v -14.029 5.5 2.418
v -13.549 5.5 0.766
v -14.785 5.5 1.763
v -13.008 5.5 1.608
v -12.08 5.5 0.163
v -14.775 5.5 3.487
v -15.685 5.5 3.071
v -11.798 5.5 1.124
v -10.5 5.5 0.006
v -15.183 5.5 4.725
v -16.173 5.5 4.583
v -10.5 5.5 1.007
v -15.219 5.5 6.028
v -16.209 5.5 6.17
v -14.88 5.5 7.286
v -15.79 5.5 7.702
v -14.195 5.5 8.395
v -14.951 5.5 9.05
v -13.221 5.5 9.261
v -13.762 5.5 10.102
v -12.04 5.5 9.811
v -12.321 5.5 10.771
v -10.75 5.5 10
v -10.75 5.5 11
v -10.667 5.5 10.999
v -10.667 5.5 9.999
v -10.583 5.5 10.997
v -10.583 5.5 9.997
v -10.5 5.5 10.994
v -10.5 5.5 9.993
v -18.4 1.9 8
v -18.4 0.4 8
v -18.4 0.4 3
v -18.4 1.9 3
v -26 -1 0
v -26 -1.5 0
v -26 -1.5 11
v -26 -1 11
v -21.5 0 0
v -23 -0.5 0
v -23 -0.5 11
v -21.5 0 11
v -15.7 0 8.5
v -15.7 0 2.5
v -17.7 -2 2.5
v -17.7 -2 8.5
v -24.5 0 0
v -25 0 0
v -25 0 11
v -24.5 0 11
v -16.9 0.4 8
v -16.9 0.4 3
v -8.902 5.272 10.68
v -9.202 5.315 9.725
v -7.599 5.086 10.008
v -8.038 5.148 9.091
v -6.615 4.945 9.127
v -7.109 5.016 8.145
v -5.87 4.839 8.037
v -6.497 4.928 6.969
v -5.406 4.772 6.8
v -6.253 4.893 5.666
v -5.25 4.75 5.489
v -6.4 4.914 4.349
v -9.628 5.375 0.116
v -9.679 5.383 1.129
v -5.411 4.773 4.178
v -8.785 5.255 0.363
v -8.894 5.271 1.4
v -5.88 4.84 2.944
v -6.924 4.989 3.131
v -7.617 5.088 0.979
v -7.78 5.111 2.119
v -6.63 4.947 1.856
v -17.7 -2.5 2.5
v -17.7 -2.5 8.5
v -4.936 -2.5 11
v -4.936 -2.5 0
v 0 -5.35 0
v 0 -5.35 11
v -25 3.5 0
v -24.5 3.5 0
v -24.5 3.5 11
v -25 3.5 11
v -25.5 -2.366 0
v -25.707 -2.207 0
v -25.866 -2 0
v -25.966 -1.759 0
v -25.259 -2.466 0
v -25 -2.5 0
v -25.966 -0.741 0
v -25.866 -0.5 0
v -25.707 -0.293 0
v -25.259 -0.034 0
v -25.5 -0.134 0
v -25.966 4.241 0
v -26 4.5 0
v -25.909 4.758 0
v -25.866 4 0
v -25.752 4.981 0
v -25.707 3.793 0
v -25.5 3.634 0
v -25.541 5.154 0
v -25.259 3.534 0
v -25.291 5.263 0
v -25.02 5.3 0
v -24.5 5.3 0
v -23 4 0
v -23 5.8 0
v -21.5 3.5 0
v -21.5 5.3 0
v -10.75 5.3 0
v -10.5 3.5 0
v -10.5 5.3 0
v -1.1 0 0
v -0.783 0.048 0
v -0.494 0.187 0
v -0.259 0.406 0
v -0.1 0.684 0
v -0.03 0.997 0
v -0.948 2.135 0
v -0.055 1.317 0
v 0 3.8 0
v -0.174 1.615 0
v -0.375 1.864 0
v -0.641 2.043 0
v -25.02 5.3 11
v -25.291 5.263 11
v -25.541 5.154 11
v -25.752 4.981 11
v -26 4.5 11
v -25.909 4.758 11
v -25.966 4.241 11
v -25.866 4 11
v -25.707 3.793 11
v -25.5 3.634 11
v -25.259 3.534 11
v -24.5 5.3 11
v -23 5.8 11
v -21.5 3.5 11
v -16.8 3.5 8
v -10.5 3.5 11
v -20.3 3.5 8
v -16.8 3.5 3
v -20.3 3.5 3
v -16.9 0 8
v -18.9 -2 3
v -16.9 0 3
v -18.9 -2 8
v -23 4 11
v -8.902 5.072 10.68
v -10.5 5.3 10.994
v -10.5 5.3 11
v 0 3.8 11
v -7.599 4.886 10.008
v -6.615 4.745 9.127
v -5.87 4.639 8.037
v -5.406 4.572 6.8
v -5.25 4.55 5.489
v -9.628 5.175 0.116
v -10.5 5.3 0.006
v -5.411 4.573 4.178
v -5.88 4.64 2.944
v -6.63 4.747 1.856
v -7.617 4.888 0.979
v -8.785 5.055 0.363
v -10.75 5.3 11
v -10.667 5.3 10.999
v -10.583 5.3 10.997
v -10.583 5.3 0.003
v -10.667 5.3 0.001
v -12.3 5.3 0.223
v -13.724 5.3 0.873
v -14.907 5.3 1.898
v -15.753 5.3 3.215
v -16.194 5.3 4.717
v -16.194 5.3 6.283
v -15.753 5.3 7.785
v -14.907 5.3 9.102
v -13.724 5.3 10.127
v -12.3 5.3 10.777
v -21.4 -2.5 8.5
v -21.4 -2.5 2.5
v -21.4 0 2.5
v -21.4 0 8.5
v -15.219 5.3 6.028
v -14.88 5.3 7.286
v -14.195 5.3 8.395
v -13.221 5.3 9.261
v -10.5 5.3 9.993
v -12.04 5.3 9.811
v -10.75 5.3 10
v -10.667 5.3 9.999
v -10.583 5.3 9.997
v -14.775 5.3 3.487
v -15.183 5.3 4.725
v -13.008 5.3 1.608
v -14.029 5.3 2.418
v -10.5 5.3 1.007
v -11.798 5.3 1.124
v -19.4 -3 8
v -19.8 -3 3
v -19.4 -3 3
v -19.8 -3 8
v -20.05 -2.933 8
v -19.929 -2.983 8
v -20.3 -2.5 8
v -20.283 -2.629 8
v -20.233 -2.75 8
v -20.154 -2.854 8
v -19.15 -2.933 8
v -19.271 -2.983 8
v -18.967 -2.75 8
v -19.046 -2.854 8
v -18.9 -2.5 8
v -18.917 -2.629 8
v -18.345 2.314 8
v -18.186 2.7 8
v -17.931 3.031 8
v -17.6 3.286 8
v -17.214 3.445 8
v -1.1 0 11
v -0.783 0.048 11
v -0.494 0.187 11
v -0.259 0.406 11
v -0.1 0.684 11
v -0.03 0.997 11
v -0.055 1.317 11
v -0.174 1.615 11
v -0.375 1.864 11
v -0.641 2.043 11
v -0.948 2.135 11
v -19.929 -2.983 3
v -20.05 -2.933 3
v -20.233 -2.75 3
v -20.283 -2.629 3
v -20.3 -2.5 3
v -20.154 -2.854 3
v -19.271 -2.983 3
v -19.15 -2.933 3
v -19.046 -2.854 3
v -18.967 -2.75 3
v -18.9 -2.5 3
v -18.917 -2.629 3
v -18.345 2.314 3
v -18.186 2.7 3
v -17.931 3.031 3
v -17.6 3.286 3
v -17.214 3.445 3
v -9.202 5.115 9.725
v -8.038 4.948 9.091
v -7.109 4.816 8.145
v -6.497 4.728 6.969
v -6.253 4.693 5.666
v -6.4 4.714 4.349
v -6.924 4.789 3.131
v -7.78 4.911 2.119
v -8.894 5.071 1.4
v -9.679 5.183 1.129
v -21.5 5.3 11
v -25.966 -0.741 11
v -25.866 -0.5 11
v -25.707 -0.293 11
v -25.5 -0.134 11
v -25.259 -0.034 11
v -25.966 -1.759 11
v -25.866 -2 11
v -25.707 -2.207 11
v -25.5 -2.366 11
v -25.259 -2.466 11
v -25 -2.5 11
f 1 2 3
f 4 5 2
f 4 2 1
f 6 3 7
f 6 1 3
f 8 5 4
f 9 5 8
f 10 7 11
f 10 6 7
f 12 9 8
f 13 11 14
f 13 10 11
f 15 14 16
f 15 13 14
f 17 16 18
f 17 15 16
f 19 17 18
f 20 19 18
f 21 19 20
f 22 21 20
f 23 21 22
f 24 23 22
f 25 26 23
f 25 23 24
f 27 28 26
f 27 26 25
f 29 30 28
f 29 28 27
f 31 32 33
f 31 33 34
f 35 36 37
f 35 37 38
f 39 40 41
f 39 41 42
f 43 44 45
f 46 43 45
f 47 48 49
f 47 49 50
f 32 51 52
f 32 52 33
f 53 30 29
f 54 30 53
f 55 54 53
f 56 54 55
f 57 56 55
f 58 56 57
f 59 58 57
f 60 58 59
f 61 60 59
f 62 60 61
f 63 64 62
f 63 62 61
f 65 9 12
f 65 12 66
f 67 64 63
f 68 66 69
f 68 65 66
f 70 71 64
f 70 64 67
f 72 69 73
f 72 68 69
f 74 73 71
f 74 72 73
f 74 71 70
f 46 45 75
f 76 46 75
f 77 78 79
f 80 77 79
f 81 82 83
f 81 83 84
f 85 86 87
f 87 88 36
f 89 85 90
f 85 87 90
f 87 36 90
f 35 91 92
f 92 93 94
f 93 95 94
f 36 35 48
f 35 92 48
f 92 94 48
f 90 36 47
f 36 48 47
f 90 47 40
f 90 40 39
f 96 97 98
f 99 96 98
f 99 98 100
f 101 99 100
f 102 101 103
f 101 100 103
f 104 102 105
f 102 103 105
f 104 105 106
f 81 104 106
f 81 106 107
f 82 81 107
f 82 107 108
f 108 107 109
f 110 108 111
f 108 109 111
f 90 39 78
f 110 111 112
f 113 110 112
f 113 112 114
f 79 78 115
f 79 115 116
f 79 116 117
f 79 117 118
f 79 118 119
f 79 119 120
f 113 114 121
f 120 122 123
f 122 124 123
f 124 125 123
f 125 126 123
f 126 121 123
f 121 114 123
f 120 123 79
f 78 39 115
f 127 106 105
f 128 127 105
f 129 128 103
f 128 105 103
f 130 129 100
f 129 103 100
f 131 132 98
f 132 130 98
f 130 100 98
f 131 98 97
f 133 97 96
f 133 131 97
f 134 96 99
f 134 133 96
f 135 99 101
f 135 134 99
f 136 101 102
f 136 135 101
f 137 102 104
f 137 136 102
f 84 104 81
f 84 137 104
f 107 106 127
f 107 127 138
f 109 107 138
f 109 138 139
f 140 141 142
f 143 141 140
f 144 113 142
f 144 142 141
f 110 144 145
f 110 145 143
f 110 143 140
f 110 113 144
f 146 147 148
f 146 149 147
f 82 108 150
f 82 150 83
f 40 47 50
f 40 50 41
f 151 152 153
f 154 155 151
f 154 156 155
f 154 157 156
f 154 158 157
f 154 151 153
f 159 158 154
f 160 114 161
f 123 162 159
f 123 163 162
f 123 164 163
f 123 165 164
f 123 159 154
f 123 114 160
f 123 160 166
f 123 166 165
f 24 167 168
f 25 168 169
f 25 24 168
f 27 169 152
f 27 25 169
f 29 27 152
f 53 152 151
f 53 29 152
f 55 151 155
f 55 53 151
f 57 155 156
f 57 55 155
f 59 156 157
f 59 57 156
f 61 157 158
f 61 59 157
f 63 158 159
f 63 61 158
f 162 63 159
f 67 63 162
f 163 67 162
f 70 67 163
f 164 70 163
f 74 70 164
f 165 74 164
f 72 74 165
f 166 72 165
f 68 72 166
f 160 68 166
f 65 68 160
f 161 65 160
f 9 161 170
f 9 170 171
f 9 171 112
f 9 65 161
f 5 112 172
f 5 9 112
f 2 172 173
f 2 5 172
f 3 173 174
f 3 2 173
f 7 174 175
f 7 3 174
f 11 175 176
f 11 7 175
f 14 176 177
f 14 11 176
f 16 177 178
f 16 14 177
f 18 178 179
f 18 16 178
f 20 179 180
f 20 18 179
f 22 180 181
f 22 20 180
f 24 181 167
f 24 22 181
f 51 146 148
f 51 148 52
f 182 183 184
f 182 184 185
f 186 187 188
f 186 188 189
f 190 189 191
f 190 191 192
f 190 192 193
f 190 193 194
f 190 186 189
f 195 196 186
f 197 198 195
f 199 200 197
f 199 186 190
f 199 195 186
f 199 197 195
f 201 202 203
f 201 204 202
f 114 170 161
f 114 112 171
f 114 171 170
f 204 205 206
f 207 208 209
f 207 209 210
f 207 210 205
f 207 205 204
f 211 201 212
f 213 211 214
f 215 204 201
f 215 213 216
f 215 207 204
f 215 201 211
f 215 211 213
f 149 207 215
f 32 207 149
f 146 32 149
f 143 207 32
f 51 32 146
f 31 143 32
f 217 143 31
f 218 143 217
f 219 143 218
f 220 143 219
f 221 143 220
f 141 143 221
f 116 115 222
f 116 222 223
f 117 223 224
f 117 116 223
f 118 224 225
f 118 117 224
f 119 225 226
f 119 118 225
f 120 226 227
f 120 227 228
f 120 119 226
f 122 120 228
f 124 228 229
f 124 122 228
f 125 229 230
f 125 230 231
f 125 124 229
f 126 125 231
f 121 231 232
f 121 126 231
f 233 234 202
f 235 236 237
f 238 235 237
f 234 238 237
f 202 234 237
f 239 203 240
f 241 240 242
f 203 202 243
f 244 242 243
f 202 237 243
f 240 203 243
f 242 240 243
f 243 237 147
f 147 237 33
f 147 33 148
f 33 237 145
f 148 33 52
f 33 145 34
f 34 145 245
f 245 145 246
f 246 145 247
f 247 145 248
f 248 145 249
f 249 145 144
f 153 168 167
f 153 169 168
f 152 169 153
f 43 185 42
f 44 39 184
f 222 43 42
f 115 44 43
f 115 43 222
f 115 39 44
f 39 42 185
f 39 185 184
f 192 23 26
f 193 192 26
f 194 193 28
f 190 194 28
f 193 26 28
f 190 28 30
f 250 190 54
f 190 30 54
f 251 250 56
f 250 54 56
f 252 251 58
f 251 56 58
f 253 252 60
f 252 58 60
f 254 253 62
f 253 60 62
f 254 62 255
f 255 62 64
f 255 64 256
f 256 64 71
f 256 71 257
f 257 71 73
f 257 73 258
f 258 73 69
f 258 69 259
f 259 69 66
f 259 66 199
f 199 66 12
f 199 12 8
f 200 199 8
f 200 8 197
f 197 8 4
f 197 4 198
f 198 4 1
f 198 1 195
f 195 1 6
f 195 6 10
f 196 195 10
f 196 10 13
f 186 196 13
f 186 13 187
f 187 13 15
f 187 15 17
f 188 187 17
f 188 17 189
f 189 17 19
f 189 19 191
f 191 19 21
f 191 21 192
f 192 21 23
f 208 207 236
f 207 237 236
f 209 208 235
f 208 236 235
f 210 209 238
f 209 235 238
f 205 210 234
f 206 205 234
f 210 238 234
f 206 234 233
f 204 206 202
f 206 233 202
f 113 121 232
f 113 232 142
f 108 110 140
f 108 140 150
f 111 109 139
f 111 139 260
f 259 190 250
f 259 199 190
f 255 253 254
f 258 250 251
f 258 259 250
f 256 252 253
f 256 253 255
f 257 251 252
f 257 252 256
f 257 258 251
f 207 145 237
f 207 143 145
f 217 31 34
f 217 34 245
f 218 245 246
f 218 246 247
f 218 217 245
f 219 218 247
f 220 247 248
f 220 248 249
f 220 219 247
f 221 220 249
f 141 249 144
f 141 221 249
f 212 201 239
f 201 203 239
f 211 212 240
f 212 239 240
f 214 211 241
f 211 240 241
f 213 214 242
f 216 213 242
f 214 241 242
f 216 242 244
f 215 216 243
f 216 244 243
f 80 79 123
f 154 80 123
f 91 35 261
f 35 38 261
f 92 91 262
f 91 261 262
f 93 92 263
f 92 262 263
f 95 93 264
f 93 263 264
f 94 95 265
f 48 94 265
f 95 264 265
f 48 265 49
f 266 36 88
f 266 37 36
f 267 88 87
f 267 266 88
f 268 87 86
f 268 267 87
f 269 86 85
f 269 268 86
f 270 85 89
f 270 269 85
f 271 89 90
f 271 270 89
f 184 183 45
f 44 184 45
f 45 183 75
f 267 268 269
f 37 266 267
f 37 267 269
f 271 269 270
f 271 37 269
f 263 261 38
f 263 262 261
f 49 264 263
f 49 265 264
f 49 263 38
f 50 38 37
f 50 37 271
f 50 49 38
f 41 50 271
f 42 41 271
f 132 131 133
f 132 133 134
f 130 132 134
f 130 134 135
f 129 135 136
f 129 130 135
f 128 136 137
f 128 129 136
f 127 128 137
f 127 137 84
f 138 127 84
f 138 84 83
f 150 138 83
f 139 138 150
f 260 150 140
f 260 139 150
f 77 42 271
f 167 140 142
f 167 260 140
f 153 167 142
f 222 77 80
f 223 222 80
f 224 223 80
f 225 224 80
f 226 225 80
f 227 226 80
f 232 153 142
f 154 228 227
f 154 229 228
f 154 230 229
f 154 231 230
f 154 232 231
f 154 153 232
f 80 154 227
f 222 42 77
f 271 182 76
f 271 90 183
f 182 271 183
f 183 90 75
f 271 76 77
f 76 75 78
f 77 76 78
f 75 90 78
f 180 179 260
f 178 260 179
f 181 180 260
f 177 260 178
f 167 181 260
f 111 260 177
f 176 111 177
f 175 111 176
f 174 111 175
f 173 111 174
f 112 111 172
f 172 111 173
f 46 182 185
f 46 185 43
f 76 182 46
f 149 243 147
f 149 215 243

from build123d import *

# Parameters (mm, degrees)
BOSS_EXTRUDE1_DEPTH   = 11
BOSS_EXTRUDE1_2_DEPTH = 11
SKETCH2_W             = 5.7
SKETCH2_H             = 6
CUT_EXTRUDE1_DEPTH    = 3
BOSS_EXTRUDE8_DEPTH   = 11
BOSS_EXTRUDE2_DEPTH   = 6
BOSS_EXTRUDE3_START   = -5.5
BOSS_EXTRUDE3_DEPTH   = 2.5
FILLET7_R             = 1
FILLET8_R             = 1
FILLET10_R            = 1
FILLET11_R            = 1
FILLET12_R            = 0.5
BOSS_EXTRUDE7_REACH   = 36.321
BOSS_EXTRUDE7_START   = 5.5
SKETCH6_R             = 5.5
SKETCH6_R_2           = 4.5
CUT_EXTRUDE3_DEPTH    = 29.820825804
BOSS_EXTRUDE9_DEPTH   = 11


with BuildPart() as part:
    # Sketch1 → Boss-Extrude1 (new body)
    with BuildSketch(Plane.XY):
        Polygon((0, 3.8), (0, 2), (-10.5, 3.5), (-21.5, 3.5), (-23, 4), (-24.5, 3.5), (-26, 3.5), (-26, 5.3), (-24.5, 5.3), (-23, 5.8), (-21.5, 5.3), (-10.5, 5.3), align=None)
    extrude(amount=BOSS_EXTRUDE1_DEPTH)



with BuildPart() as body_2:
    # Sketch1 → Boss-Extrude1 2 (new body)
    with BuildSketch(Plane.XY):
        Polygon((0, 0), (0, -2.5), (-26, -2.5), (-26, 0), (-24.5, 0), (-23, -0.5), (-21.5, 0), align=None)
    extrude(amount=BOSS_EXTRUDE1_2_DEPTH)

    # Sketch2 → Cut-Extrude1 (cut)
    with BuildSketch(Plane.XZ.offset(2.5)):
        with Locations((-18.55, 5.5)):
            Rectangle(SKETCH2_W, SKETCH2_H)
    extrude(amount=-CUT_EXTRUDE1_DEPTH, mode=Mode.SUBTRACT)


with BuildPart() as part_1:
    add(part.part)

    add(body_2.part)  # Boss-Extrude8 merges body 2
    # Sketch8 → Boss-Extrude8 (add)
    with BuildSketch(Plane(origin=(0, 0, 0), x_dir=(-1, 0, 0), z_dir=(0, 0, -1))):
        with BuildLine():
            Line((0.948237354, 2.135462479), (0, 2))
            Line((0, 2), (0, 0))
            Line((0, 0), (1.1, 0))
            ThreePointArc((1.1, 0), (0.029575797, 0.997051253), (0.948237354, 2.135462479))
        make_face()
    extrude(amount=-BOSS_EXTRUDE8_DEPTH)

    # Sketch3 → Boss-Extrude2 (add)
    with BuildSketch(Plane.XY.offset(2.5)):
        Polygon((-15.7, 0), (-17.7, -2), (-17.7, -2.5), (-15.7, -2.5), align=None)
    extrude(amount=BOSS_EXTRUDE2_DEPTH)

    # Sketch4 → Boss-Extrude3 (add, symmetric)
    with BuildSketch(Plane.XY.offset(11).offset(BOSS_EXTRUDE3_START)):
        with BuildLine():
            Line((-18.9, -2), (-16.9, 0))
            Line((-16.9, 0), (-16.9, 0.4))
            Line((-16.9, 0.4), (-18.4, 0.4))
            Line((-18.4, 0.4), (-18.4, 1.9))
            ThreePointArc((-18.4, 1.9), (-17.93137085, 3.03137085), (-16.8, 3.5))
            Line((-16.8, 3.5), (-20.3, 3.5))
            Line((-20.3, 3.5), (-20.3, -3))
            Line((-20.3, -3), (-18.9, -3))
            Line((-18.9, -3), (-18.9, -2))
        make_face()
    extrude(amount=BOSS_EXTRUDE3_DEPTH, both=True)

    # Fillet7
    fillet7_edges = [part_1.edges().sort_by_distance(p)[0] for p in [
        (-26, 0, 5.5),
    ]]
    fillet(fillet7_edges, radius=FILLET7_R)

    # Fillet8
    fillet8_edges = [part_1.edges().sort_by_distance(p)[0] for p in [
        (-26, 3.5, 5.5),
    ]]
    fillet(fillet8_edges, radius=FILLET8_R)

    # Fillet10
    # the kernel refuses this fillet: 1 mm, written as the material it takes off along each edge
    with BuildSketch(Plane(origin=(-26, 5.3, -2.449489743), x_dir=(1.6120438317551944e-12, -1.0, 0), z_dir=(0, 0, 1))) as fillet10_piece_1:
        with BuildLine():
            CenterArc((1, 0.979795897), FILLET10_R, 180, 78.463040967)
            Line((0, 0.979795897), (-0.02, 0.979795897))
            Line((-0.02, 0.979795897), (-0.02, 0))
            Line((-0.02, 0), (0, -0.02))
            ThreePointArc((0, -0.02), (0.4, -0.02), (0.796, -0.019595918))
            Line((0.796, -0.019595918), (0.8, 0))
        make_face()
    extrude(amount=15.898979486, mode=Mode.SUBTRACT)

    # Fillet11
    fillet11_edges = [part_1.edges().sort_by_distance(p)[0] for p in [
        (-26, -2.5, 5.5),
    ]]
    fillet(fillet11_edges, radius=FILLET11_R)

    # Fillet12
    fillet12_edges = [part_1.edges().sort_by_distance(p)[0] for p in [
        (-18.9, -3, 5.5),
        (-20.3, -3, 5.5),
    ]]
    fillet(fillet12_edges, radius=FILLET12_R)

    # Sketch6 → Boss-Extrude7 (add, up to next)
    with BuildSketch(Plane(origin=(0, 0, 0), x_dir=(1, 0, 0), z_dir=(0, 1, 0)).offset(BOSS_EXTRUDE7_START), mode=Mode.PRIVATE) as boss_extrude7_sk1:
        with Locations(Location((-10.75, -5.5, 0), (0, 0, 270))):
            Circle(SKETCH6_R)
        with Locations(Location((-10.75, -5.5, 0), (0, 0, 270))):
            Circle(SKETCH6_R_2, mode=Mode.SUBTRACT)
    boss_extrude7_tool1 = extrude(boss_extrude7_sk1.sketch, amount=-BOSS_EXTRUDE7_REACH, mode=Mode.PRIVATE) - part_1.part
    add(boss_extrude7_tool1.solids().sort_by_distance((-10.75, 5.5, 0.155563))[0])

    # Sketch7 → Cut-Extrude3 (cut, through all)
    with BuildSketch(Plane.XY):
        Polygon((-10.5, 5.5), (-0.5, 4.071428571), (-0.5, 5.5), align=None)
    extrude(amount=CUT_EXTRUDE3_DEPTH, mode=Mode.SUBTRACT)

    # Sketch10 → Boss-Extrude9 (add)
    with BuildSketch(Plane(origin=(0, 0, 0), x_dir=(-1, 0, 0), z_dir=(0, 0, -1))):
        Polygon((0, -2.5), (4.936344802, -2.5), (0, -5.35), align=None)
    extrude(amount=-BOSS_EXTRUDE9_DEPTH)


solid = part_1.part
